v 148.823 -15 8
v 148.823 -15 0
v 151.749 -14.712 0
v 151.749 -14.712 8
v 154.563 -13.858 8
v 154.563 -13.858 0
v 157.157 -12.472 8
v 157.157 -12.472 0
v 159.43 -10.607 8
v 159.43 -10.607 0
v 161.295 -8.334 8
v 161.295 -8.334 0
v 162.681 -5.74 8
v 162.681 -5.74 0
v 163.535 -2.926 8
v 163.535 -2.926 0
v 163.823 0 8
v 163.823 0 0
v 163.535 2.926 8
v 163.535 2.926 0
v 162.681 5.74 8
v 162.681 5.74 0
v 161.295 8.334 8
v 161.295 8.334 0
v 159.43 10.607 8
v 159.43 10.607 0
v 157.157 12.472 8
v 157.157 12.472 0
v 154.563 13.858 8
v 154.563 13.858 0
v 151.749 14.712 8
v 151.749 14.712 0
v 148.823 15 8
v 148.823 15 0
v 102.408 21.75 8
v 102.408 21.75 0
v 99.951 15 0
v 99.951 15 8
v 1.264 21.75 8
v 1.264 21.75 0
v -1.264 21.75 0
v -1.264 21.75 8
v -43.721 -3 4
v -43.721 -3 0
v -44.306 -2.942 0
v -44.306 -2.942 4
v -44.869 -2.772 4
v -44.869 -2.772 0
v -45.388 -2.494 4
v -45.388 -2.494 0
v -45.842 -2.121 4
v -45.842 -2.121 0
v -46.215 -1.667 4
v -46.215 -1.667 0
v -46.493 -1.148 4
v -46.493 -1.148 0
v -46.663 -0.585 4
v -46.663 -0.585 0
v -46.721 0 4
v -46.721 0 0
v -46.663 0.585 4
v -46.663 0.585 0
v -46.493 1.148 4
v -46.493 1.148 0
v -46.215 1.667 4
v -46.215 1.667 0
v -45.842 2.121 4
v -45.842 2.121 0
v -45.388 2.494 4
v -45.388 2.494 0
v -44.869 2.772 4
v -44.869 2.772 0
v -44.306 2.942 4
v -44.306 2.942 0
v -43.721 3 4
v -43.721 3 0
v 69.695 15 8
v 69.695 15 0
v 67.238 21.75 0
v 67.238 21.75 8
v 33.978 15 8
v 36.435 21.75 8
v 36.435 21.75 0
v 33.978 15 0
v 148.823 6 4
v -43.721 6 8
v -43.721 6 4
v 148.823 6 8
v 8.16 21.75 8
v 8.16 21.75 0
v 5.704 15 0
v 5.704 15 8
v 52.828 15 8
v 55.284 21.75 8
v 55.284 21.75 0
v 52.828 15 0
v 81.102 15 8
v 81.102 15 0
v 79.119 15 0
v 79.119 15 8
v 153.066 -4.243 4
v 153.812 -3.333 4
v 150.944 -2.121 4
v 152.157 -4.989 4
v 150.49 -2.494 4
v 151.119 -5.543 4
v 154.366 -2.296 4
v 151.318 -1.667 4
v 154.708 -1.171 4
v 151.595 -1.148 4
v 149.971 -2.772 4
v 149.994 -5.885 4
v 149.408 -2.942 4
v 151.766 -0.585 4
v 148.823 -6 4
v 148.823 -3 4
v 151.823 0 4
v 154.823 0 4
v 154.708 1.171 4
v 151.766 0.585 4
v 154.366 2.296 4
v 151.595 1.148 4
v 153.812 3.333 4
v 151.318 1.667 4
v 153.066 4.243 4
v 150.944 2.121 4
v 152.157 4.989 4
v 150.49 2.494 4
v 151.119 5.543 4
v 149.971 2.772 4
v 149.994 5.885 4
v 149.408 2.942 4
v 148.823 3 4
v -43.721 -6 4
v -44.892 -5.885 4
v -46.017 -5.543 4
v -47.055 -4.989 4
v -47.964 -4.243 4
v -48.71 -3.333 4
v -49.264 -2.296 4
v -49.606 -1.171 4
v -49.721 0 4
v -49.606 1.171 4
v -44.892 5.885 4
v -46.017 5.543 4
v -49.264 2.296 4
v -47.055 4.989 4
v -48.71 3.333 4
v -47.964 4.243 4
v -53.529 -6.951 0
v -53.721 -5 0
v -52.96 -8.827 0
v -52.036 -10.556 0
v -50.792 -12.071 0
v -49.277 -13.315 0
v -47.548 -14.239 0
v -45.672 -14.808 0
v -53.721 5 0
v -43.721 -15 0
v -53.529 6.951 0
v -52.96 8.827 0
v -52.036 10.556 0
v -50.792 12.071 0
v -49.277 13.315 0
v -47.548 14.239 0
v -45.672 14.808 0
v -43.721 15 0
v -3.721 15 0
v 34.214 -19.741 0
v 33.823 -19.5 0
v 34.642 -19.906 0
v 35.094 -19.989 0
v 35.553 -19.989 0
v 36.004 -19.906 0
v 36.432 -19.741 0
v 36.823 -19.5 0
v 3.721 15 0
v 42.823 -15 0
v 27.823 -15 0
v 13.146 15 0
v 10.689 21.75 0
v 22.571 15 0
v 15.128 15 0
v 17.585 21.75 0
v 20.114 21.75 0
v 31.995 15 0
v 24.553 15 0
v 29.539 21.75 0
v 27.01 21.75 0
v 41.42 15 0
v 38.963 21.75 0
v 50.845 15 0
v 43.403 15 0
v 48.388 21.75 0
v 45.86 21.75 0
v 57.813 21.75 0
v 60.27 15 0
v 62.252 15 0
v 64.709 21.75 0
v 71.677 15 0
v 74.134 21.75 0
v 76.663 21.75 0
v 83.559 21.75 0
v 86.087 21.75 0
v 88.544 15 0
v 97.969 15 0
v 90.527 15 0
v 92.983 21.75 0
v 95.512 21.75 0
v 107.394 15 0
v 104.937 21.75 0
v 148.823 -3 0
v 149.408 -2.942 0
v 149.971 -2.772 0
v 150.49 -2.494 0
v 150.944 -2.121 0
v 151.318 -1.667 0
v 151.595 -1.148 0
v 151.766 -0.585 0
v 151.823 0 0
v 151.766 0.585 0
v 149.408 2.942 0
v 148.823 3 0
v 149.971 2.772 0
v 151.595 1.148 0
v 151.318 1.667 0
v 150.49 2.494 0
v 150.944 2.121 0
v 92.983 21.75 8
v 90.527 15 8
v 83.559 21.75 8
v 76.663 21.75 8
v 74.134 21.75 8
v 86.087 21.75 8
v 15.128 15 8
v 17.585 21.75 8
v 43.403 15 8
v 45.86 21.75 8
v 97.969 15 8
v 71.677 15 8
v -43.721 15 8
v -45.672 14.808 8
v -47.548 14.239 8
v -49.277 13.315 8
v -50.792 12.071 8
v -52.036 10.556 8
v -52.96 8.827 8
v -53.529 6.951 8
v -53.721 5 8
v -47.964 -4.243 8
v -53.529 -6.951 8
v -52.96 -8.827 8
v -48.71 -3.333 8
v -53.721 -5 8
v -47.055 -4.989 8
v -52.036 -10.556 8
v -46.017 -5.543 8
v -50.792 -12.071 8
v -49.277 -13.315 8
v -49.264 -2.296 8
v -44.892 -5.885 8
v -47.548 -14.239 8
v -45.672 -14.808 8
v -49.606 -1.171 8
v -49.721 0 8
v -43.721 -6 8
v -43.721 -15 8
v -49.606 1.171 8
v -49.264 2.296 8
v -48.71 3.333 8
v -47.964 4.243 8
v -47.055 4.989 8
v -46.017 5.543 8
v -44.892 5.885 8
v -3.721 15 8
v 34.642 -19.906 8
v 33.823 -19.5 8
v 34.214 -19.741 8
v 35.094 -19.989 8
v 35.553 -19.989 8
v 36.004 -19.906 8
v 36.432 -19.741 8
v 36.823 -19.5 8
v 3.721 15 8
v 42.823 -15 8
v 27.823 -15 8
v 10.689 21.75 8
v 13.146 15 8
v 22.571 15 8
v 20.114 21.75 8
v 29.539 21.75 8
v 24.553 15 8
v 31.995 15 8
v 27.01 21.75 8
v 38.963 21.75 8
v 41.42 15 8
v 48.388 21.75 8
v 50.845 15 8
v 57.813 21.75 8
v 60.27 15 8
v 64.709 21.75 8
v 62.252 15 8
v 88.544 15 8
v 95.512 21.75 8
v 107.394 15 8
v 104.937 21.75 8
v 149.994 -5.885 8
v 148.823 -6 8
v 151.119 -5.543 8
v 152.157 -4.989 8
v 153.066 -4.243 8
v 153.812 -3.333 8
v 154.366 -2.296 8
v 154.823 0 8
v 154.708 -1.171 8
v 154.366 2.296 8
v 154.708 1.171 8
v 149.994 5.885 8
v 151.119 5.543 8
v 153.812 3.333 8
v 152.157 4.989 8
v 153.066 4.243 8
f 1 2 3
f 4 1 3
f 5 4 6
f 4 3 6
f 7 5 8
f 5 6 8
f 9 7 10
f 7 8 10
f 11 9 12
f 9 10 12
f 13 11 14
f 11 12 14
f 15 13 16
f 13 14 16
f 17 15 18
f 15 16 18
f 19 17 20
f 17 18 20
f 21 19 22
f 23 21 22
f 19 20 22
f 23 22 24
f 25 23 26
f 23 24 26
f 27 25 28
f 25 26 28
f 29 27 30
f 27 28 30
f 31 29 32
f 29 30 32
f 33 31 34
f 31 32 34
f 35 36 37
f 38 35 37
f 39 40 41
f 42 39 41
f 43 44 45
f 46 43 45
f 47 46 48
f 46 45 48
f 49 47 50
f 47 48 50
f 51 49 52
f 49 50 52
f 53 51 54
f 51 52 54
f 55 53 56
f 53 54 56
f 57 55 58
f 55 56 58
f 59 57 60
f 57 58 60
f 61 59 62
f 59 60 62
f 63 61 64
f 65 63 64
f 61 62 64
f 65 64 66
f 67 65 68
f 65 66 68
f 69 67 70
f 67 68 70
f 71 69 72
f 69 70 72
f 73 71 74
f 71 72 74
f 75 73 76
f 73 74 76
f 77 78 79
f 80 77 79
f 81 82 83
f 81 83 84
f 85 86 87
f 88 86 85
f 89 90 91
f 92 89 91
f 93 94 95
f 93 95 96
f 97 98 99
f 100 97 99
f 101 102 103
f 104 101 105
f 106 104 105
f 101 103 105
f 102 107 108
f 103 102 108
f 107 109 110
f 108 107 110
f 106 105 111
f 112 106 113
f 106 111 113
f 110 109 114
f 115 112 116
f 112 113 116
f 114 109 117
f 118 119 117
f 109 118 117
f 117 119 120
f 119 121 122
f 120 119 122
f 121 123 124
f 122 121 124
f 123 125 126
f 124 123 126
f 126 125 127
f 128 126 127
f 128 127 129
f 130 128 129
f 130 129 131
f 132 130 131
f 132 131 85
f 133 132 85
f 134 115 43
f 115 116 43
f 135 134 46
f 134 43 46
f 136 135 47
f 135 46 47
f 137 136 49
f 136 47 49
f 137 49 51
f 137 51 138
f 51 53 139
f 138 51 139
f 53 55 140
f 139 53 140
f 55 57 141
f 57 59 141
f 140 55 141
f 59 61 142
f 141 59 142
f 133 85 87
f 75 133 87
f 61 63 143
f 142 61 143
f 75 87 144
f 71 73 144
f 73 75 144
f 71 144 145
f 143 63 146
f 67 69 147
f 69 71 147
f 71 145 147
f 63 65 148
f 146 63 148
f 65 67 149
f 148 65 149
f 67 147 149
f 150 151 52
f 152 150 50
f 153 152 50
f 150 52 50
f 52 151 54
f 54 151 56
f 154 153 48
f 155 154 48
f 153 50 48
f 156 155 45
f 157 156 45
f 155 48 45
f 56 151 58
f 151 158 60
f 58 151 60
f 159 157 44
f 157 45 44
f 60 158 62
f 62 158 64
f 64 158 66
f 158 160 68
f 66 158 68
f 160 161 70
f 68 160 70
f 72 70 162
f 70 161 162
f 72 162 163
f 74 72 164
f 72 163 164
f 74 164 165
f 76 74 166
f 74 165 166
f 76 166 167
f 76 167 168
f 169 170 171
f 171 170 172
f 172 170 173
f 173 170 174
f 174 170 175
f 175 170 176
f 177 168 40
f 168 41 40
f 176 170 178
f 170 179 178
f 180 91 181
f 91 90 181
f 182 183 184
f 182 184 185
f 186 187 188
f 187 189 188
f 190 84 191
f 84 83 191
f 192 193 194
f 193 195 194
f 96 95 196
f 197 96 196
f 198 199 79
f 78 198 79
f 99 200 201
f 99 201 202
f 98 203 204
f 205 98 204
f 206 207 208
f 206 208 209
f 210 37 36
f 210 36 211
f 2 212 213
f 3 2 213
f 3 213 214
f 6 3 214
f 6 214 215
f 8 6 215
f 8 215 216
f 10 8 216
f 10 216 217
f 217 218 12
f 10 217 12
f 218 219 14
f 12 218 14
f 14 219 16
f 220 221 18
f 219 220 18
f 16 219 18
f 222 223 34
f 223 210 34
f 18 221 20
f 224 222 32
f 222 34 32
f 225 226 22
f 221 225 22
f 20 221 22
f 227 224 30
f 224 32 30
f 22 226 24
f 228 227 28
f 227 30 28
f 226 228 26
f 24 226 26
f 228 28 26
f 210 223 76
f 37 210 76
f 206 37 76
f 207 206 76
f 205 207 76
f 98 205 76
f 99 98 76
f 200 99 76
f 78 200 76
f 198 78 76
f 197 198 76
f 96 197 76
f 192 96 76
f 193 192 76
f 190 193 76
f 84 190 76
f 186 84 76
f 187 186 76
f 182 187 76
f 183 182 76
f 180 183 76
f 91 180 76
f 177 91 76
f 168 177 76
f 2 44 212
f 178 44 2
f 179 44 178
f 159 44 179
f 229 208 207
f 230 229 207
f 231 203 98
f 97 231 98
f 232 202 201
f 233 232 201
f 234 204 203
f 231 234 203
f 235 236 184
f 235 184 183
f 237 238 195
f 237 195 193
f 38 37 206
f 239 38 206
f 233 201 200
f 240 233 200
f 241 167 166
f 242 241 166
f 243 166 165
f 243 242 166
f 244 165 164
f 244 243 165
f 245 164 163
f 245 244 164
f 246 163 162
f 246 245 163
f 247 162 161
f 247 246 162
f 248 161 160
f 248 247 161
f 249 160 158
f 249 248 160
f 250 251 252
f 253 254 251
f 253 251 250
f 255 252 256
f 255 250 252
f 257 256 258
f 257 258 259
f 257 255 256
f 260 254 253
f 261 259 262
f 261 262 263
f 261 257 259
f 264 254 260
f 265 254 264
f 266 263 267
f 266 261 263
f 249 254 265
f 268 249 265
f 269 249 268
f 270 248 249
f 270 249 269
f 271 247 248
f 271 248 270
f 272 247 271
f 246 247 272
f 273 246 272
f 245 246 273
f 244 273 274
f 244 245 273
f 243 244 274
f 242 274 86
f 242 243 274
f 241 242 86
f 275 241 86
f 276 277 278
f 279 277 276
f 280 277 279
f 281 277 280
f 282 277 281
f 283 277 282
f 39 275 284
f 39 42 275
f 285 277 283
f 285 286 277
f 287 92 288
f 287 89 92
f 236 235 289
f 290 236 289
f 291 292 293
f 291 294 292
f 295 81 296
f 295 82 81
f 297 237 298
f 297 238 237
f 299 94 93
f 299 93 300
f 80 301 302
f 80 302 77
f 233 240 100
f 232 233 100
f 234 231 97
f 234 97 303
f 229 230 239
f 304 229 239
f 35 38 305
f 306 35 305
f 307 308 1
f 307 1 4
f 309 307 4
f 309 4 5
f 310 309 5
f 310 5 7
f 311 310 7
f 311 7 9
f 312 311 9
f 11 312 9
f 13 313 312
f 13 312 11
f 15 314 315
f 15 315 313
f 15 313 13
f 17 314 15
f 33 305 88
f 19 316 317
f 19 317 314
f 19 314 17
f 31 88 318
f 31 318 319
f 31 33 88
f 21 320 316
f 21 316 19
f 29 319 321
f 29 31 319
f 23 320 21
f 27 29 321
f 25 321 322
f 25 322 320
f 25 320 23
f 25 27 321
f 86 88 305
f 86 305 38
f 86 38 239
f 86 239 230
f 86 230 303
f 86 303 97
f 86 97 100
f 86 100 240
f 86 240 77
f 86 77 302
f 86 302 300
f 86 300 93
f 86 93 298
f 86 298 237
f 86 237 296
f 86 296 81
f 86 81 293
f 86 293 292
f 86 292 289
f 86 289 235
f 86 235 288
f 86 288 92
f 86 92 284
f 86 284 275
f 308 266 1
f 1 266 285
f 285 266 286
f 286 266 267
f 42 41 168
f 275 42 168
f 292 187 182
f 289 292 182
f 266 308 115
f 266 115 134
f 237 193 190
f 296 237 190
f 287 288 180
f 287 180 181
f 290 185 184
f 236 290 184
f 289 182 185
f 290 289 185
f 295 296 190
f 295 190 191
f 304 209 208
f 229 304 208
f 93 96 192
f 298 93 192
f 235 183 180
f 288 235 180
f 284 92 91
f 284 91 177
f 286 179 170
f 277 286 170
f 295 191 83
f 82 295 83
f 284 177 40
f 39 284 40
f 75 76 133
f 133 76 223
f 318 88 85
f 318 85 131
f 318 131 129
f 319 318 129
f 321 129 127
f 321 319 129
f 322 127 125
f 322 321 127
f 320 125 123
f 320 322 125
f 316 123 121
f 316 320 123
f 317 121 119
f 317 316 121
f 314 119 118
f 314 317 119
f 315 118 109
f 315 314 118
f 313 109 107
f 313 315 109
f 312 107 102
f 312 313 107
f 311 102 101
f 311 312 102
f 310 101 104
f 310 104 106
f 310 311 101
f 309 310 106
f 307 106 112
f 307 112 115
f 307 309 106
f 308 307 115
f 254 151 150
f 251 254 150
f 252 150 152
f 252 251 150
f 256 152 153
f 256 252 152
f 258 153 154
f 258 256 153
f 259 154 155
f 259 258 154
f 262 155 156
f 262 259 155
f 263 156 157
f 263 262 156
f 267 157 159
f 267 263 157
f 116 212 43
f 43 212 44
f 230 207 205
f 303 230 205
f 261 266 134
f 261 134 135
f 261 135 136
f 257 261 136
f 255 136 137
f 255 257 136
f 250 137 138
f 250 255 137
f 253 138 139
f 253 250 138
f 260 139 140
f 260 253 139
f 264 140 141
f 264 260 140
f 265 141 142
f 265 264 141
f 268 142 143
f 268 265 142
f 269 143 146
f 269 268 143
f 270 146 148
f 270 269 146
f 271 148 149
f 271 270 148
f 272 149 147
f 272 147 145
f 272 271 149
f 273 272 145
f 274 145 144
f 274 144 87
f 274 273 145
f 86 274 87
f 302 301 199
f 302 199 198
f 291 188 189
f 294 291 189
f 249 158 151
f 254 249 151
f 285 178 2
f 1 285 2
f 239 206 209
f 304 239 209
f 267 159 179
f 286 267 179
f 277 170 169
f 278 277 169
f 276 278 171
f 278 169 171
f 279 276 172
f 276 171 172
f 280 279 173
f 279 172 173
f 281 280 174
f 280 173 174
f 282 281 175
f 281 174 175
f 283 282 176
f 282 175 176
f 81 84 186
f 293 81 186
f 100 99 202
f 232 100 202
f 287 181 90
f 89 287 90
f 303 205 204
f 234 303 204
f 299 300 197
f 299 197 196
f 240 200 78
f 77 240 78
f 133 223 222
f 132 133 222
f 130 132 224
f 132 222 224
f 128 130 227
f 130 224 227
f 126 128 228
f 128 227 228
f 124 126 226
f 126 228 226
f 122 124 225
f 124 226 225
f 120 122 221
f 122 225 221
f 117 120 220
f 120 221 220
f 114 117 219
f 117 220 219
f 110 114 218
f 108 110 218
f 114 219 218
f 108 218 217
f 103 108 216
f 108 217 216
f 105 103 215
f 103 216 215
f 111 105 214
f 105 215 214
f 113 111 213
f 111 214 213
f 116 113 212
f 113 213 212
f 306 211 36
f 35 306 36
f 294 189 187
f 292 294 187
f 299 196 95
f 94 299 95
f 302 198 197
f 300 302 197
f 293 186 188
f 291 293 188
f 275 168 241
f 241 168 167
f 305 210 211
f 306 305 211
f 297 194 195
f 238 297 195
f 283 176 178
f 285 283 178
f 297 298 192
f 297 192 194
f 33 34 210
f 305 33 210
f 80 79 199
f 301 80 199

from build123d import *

# Parameters (mm, degrees)
BOSS_EXTRU_1_DEPTH      = 8
ENL_V_MAT_EXTRU_1_DEPTH = 4
CONG_2_R                = 10


with BuildPart() as part:
    # Esquisse1 → Boss.-Extru.1 (new body)
    with BuildSketch(Plane.XY):
        with BuildLine():
            Line((3.721082869, 15), (1.264283788, 21.75))
            Line((1.264283788, 21.75), (-1.264283788, 21.75))
            Line((-1.264283788, 21.75), (-3.721082869, 15))
            Line((-3.721082869, 15), (-53.721082869, 15))
            Line((-53.721082869, 15), (-53.721082869, -15))
            Line((-53.721082869, -15), (27.823144925, -15))
            Line((27.823144925, -15), (33.823144925, -19.5))
            ThreePointArc((33.823144925, -19.5), (35.323144925, -20), (36.823144925, -19.5))
            Line((36.823144925, -19.5), (42.823144925, -15))
            Line((42.823144925, -15), (148.823144925, -15))
            ThreePointArc((148.823144925, -15), (163.823144925, 0), (148.823144925, 15))
            Line((148.823144925, 15), (107.393640429, 15))
            Line((107.393640429, 15), (104.936841348, 21.75))
            Line((104.936841348, 21.75), (102.408273772, 21.75))
            Line((102.408273772, 21.75), (99.951474691, 15))
            Line((99.951474691, 15), (97.968862469, 15))
            Line((97.968862469, 15), (95.512063388, 21.75))
            Line((95.512063388, 21.75), (92.983495812, 21.75))
            Line((92.983495812, 21.75), (90.526696731, 15))
            Line((90.526696731, 15), (88.544084509, 15))
            Line((88.544084509, 15), (86.087285428, 21.75))
            Line((86.087285428, 21.75), (83.558717852, 21.75))
            Line((83.558717852, 21.75), (81.101918771, 15))
            Line((81.101918771, 15), (79.119306549, 15))
            Line((79.119306549, 15), (76.662507468, 21.75))
            Line((76.662507468, 21.75), (74.133939892, 21.75))
            Line((74.133939892, 21.75), (71.677140811, 15))
            Line((71.677140811, 15), (69.694528589, 15))
            Line((69.694528589, 15), (67.237729508, 21.75))
            Line((67.237729508, 21.75), (64.709161932, 21.75))
            Line((64.709161932, 21.75), (62.252362851, 15))
            Line((62.252362851, 15), (60.269750629, 15))
            Line((60.269750629, 15), (57.812951548, 21.75))
            Line((57.812951548, 21.75), (55.284383972, 21.75))
            Line((55.284383972, 21.75), (52.827584891, 15))
            Line((52.827584891, 15), (50.844972669, 15))
            Line((50.844972669, 15), (48.388173588, 21.75))
            Line((48.388173588, 21.75), (45.859606012, 21.75))
            Line((45.859606012, 21.75), (43.402806931, 15))
            Line((43.402806931, 15), (41.420194709, 15))
            Line((41.420194709, 15), (38.963395628, 21.75))
            Line((38.963395628, 21.75), (36.434828052, 21.75))
            Line((36.434828052, 21.75), (33.978028971, 15))
            Line((33.978028971, 15), (31.995416749, 15))
            Line((31.995416749, 15), (29.538617668, 21.75))
            Line((29.538617668, 21.75), (27.010050092, 21.75))
            Line((27.010050092, 21.75), (24.553251011, 15))
            Line((24.553251011, 15), (22.570638789, 15))
            Line((22.570638789, 15), (20.113839708, 21.75))
            Line((20.113839708, 21.75), (17.585272132, 21.75))
            Line((17.585272132, 21.75), (15.128473051, 15))
            Line((15.128473051, 15), (13.145860829, 15))
            Line((13.145860829, 15), (10.689061748, 21.75))
            Line((10.689061748, 21.75), (8.160494172, 21.75))
            Line((8.160494172, 21.75), (5.703695091, 15))
            Line((5.703695091, 15), (3.721082869, 15))
        make_face()
        with BuildLine():
            Line((-43.721082869, 3), (148.823144925, 3))
            ThreePointArc((148.823144925, 3), (151.823144925, 0), (148.823144925, -3))
            Line((148.823144925, -3), (-43.721082869, -3))
            ThreePointArc((-43.721082869, -3), (-46.721082869, 0), (-43.721082869, 3))
        make_face(mode=Mode.SUBTRACT)
    extrude(amount=BOSS_EXTRU_1_DEPTH)

    # Esquisse2 → Enlèv. mat.-Extru.1 (cut)
    with BuildSketch(Plane.XY.offset(8)):
        with BuildLine():
            Line((-43.721082869, 6), (148.823144925, 6))
            ThreePointArc((148.823144925, 6), (154.823144925, 0), (148.823144925, -6))
            Line((148.823144925, -6), (-43.721082869, -6))
            ThreePointArc((-43.721082869, -6), (-49.721082869, 0), (-43.721082869, 6))
        make_face()
    extrude(amount=-ENL_V_MAT_EXTRU_1_DEPTH, mode=Mode.SUBTRACT)

    # Congé2
    cong_2_edges = [part.edges().sort_by_distance(p)[0] for p in [
        (-53.721082869, -15, 4),
        (-53.721082869, 15, 4),
    ]]
    fillet(cong_2_edges, radius=CONG_2_R)


solid = part.part
